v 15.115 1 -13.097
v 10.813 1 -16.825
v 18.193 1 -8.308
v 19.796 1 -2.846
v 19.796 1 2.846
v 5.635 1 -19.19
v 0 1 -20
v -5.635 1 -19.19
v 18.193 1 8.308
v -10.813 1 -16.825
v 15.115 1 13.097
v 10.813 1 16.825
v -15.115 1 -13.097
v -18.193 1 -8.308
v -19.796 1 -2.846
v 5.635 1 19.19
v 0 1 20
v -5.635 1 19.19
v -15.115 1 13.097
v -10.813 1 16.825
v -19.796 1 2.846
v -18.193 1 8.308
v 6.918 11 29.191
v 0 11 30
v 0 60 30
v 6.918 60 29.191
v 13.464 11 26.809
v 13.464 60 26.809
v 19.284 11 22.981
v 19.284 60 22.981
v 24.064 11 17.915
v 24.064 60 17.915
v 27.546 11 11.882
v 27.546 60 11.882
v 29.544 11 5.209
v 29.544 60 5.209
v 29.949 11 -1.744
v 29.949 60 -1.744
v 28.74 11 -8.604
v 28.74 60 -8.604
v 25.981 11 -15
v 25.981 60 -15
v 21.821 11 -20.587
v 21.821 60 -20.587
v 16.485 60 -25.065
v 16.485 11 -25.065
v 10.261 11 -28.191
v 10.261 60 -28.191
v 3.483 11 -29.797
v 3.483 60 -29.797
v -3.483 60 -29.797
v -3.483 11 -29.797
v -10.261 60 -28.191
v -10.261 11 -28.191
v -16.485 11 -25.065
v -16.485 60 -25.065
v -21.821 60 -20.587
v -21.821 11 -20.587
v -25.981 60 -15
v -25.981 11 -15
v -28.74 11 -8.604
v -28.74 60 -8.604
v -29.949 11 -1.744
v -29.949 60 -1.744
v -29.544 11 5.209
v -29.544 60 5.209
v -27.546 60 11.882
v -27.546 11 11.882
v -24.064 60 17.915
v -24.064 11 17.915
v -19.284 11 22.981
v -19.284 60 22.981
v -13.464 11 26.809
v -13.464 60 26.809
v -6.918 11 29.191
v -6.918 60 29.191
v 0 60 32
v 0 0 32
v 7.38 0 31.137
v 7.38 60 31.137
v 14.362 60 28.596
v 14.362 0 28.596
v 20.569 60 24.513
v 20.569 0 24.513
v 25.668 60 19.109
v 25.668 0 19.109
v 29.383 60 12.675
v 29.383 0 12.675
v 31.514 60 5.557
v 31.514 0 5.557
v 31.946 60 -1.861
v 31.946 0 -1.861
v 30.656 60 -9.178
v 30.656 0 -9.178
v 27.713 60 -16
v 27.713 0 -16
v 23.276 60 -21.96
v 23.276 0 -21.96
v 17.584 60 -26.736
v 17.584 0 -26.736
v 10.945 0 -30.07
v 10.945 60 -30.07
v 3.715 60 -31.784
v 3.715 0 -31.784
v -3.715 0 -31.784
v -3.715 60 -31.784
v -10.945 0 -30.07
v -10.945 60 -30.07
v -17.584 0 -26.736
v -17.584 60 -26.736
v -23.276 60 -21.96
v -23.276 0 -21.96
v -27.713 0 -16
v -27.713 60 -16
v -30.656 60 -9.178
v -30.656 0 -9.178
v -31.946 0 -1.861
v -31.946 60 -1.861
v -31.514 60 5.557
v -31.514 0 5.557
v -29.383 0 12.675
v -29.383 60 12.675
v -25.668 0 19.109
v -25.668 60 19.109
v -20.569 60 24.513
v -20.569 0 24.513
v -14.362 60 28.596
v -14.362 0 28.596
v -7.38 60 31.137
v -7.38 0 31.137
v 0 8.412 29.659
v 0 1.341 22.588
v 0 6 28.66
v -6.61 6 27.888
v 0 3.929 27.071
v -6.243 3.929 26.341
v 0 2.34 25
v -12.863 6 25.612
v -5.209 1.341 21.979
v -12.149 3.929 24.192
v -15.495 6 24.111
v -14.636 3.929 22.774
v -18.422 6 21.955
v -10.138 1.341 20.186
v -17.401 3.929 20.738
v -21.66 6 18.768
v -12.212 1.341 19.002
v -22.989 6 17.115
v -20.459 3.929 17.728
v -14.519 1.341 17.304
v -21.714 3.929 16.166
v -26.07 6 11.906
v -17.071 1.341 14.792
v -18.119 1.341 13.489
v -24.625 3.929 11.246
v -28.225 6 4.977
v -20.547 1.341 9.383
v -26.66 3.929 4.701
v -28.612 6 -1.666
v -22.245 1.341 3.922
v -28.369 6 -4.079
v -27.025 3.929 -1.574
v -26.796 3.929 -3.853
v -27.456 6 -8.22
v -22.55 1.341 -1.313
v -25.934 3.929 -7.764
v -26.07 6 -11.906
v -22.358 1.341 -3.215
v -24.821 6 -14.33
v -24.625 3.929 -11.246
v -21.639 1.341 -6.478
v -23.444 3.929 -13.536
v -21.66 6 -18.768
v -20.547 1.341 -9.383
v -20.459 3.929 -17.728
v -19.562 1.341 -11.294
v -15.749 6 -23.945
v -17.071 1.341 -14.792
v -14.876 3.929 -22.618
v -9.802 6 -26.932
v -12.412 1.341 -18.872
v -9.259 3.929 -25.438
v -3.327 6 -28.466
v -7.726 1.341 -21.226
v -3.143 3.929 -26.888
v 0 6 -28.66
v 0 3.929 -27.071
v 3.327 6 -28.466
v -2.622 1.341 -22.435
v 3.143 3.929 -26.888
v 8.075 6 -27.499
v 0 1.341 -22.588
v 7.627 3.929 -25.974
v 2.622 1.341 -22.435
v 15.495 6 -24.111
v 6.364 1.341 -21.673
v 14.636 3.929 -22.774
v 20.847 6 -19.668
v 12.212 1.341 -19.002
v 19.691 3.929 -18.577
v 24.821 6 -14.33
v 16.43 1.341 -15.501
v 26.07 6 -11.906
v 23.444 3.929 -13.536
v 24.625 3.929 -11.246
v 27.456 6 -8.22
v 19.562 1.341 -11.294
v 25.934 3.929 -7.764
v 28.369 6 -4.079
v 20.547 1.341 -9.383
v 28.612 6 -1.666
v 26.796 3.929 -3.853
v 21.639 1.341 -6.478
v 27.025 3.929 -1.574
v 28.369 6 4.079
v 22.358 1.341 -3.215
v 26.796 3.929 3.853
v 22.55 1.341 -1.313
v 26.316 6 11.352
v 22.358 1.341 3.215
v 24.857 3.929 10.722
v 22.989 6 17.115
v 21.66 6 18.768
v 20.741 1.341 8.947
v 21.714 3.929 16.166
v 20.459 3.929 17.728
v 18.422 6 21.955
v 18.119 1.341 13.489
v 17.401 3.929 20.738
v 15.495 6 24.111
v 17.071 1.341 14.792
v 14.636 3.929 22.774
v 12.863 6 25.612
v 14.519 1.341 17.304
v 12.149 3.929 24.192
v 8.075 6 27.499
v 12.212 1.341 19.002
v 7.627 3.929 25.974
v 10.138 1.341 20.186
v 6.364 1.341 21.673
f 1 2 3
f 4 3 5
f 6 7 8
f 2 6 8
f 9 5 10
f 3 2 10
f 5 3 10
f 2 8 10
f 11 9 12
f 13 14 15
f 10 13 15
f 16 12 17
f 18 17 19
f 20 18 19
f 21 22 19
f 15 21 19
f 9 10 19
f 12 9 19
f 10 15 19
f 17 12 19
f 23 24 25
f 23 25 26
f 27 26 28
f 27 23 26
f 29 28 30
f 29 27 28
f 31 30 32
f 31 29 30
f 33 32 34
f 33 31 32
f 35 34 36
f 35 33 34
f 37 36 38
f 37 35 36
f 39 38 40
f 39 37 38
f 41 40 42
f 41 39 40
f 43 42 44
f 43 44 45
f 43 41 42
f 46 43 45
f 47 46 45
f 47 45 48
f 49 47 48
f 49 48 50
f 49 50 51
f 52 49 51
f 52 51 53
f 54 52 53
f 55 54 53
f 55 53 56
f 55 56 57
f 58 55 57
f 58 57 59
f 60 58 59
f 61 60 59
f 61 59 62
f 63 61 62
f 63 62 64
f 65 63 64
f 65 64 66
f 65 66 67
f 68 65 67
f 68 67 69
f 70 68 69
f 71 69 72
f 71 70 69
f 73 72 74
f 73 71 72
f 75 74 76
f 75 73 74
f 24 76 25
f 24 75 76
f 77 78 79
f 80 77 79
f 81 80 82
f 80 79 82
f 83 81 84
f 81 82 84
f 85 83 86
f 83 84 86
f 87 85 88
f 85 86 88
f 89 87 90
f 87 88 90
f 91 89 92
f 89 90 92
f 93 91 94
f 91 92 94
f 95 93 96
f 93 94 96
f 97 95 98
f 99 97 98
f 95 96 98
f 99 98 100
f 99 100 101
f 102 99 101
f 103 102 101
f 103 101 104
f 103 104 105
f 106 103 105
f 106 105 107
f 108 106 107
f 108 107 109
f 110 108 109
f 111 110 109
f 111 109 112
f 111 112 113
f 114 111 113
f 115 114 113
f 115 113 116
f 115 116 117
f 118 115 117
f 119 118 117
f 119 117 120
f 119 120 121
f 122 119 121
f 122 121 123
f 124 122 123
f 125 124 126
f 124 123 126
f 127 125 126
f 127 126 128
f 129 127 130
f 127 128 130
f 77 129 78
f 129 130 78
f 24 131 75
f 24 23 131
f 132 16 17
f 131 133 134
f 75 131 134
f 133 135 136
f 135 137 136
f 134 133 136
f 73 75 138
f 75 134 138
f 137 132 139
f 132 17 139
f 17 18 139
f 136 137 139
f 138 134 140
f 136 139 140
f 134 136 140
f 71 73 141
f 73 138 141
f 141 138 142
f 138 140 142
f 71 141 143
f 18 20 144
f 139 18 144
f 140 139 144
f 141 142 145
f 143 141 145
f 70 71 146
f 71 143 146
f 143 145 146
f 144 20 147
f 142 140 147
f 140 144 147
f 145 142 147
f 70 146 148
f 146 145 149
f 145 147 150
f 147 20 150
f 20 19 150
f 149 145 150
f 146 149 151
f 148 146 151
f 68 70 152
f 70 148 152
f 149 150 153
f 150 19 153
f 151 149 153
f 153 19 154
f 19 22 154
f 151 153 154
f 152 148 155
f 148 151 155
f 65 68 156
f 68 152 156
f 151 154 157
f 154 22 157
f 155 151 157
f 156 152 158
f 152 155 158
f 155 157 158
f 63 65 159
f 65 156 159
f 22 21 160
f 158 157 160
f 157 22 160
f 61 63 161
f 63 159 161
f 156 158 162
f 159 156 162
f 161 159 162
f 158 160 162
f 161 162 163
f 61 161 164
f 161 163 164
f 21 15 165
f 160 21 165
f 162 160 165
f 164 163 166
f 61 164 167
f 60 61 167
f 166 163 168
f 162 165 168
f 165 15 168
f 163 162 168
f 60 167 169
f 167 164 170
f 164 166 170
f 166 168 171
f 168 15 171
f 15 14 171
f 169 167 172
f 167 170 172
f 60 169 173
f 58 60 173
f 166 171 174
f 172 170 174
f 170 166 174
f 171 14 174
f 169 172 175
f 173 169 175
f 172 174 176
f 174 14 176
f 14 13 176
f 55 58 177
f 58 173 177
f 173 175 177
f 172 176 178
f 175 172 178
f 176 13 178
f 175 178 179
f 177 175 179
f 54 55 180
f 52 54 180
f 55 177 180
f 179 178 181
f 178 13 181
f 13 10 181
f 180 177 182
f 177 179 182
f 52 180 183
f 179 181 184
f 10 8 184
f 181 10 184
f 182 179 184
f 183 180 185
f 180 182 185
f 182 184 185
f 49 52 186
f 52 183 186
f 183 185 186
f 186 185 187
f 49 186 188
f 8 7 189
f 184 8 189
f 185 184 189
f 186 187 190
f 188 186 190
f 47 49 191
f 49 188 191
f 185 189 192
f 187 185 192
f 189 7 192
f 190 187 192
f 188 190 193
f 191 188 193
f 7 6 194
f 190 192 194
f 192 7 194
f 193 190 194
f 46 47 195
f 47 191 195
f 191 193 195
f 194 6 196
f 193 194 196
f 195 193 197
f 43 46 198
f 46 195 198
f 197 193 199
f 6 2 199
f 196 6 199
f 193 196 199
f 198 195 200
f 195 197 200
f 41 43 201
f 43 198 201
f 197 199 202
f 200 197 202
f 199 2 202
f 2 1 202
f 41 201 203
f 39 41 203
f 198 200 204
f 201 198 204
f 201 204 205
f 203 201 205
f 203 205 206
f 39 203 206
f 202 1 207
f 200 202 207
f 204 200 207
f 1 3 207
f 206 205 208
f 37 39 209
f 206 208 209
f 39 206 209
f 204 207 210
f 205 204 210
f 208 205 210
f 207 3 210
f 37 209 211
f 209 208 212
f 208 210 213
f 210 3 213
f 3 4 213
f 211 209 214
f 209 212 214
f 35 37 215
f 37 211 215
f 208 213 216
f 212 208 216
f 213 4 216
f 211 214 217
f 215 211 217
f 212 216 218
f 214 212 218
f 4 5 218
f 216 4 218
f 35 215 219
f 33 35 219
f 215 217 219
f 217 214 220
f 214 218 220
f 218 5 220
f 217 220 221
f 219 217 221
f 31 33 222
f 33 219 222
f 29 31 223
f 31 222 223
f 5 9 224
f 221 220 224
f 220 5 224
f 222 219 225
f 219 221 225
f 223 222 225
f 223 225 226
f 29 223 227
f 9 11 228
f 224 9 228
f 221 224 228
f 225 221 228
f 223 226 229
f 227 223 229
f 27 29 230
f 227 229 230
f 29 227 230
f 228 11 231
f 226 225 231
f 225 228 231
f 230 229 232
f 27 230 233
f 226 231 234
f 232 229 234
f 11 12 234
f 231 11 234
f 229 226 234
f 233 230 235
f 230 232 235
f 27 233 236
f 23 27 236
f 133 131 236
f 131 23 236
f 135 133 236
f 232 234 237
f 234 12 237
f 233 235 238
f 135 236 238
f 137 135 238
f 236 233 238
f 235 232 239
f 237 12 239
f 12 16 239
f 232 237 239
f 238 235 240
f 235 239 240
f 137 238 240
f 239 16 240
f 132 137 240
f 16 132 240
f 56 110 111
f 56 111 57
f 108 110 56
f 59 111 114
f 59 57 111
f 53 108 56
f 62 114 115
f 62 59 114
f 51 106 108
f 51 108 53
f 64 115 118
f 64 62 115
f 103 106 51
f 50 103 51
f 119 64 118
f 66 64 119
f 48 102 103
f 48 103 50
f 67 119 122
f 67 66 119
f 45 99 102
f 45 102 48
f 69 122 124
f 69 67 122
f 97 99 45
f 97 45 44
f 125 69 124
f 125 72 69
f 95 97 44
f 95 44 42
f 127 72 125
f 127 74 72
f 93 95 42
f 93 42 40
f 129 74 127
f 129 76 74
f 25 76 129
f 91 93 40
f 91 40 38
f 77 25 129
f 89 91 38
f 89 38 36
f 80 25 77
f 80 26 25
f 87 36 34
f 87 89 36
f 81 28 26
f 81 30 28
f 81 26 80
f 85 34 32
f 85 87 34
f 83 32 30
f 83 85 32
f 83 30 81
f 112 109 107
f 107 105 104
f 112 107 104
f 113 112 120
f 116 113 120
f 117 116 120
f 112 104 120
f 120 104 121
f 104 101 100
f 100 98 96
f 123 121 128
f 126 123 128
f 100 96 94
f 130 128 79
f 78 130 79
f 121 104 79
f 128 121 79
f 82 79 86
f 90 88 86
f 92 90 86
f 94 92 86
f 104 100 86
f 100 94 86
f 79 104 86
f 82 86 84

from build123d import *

# Parameters (mm, degrees)
ESQUISSE2_R        = 32
ESQUISSE2_R_2      = 30
BOSS_EXTRU_2_DEPTH = 60
ESQUISSE3_R        = 32
BOSS_EXTRU_3_DEPTH = 1
CONG_1_R           = 10


with BuildPart() as part:
    # Esquisse2 → Boss.-Extru.2 (new body)
    with BuildSketch(Plane(origin=(0, 0, 0), x_dir=(1, 0, 0), z_dir=(0, 1, 0))):
        with Locations(Location((0, 0, 0), (0, 0, 270))):
            Circle(ESQUISSE2_R)
        with Locations(Location((0, 0, 0), (0, 0, 270))):
            Circle(ESQUISSE2_R_2, mode=Mode.SUBTRACT)
    extrude(amount=BOSS_EXTRU_2_DEPTH)

    # Esquisse3 → Boss.-Extru.3 (add)
    with BuildSketch(Plane.XZ):
        with Locations(Location((0, 0, 0), (0, 0, 90))):
            Circle(ESQUISSE3_R)
    extrude(amount=-BOSS_EXTRU_3_DEPTH)

    # Congé1
    cong_1_edges = [part.edges().sort_by_distance(p)[0] for p in [
        (0, 1, -30),
    ]]
    fillet(cong_1_edges, radius=CONG_1_R)


solid = part.part
